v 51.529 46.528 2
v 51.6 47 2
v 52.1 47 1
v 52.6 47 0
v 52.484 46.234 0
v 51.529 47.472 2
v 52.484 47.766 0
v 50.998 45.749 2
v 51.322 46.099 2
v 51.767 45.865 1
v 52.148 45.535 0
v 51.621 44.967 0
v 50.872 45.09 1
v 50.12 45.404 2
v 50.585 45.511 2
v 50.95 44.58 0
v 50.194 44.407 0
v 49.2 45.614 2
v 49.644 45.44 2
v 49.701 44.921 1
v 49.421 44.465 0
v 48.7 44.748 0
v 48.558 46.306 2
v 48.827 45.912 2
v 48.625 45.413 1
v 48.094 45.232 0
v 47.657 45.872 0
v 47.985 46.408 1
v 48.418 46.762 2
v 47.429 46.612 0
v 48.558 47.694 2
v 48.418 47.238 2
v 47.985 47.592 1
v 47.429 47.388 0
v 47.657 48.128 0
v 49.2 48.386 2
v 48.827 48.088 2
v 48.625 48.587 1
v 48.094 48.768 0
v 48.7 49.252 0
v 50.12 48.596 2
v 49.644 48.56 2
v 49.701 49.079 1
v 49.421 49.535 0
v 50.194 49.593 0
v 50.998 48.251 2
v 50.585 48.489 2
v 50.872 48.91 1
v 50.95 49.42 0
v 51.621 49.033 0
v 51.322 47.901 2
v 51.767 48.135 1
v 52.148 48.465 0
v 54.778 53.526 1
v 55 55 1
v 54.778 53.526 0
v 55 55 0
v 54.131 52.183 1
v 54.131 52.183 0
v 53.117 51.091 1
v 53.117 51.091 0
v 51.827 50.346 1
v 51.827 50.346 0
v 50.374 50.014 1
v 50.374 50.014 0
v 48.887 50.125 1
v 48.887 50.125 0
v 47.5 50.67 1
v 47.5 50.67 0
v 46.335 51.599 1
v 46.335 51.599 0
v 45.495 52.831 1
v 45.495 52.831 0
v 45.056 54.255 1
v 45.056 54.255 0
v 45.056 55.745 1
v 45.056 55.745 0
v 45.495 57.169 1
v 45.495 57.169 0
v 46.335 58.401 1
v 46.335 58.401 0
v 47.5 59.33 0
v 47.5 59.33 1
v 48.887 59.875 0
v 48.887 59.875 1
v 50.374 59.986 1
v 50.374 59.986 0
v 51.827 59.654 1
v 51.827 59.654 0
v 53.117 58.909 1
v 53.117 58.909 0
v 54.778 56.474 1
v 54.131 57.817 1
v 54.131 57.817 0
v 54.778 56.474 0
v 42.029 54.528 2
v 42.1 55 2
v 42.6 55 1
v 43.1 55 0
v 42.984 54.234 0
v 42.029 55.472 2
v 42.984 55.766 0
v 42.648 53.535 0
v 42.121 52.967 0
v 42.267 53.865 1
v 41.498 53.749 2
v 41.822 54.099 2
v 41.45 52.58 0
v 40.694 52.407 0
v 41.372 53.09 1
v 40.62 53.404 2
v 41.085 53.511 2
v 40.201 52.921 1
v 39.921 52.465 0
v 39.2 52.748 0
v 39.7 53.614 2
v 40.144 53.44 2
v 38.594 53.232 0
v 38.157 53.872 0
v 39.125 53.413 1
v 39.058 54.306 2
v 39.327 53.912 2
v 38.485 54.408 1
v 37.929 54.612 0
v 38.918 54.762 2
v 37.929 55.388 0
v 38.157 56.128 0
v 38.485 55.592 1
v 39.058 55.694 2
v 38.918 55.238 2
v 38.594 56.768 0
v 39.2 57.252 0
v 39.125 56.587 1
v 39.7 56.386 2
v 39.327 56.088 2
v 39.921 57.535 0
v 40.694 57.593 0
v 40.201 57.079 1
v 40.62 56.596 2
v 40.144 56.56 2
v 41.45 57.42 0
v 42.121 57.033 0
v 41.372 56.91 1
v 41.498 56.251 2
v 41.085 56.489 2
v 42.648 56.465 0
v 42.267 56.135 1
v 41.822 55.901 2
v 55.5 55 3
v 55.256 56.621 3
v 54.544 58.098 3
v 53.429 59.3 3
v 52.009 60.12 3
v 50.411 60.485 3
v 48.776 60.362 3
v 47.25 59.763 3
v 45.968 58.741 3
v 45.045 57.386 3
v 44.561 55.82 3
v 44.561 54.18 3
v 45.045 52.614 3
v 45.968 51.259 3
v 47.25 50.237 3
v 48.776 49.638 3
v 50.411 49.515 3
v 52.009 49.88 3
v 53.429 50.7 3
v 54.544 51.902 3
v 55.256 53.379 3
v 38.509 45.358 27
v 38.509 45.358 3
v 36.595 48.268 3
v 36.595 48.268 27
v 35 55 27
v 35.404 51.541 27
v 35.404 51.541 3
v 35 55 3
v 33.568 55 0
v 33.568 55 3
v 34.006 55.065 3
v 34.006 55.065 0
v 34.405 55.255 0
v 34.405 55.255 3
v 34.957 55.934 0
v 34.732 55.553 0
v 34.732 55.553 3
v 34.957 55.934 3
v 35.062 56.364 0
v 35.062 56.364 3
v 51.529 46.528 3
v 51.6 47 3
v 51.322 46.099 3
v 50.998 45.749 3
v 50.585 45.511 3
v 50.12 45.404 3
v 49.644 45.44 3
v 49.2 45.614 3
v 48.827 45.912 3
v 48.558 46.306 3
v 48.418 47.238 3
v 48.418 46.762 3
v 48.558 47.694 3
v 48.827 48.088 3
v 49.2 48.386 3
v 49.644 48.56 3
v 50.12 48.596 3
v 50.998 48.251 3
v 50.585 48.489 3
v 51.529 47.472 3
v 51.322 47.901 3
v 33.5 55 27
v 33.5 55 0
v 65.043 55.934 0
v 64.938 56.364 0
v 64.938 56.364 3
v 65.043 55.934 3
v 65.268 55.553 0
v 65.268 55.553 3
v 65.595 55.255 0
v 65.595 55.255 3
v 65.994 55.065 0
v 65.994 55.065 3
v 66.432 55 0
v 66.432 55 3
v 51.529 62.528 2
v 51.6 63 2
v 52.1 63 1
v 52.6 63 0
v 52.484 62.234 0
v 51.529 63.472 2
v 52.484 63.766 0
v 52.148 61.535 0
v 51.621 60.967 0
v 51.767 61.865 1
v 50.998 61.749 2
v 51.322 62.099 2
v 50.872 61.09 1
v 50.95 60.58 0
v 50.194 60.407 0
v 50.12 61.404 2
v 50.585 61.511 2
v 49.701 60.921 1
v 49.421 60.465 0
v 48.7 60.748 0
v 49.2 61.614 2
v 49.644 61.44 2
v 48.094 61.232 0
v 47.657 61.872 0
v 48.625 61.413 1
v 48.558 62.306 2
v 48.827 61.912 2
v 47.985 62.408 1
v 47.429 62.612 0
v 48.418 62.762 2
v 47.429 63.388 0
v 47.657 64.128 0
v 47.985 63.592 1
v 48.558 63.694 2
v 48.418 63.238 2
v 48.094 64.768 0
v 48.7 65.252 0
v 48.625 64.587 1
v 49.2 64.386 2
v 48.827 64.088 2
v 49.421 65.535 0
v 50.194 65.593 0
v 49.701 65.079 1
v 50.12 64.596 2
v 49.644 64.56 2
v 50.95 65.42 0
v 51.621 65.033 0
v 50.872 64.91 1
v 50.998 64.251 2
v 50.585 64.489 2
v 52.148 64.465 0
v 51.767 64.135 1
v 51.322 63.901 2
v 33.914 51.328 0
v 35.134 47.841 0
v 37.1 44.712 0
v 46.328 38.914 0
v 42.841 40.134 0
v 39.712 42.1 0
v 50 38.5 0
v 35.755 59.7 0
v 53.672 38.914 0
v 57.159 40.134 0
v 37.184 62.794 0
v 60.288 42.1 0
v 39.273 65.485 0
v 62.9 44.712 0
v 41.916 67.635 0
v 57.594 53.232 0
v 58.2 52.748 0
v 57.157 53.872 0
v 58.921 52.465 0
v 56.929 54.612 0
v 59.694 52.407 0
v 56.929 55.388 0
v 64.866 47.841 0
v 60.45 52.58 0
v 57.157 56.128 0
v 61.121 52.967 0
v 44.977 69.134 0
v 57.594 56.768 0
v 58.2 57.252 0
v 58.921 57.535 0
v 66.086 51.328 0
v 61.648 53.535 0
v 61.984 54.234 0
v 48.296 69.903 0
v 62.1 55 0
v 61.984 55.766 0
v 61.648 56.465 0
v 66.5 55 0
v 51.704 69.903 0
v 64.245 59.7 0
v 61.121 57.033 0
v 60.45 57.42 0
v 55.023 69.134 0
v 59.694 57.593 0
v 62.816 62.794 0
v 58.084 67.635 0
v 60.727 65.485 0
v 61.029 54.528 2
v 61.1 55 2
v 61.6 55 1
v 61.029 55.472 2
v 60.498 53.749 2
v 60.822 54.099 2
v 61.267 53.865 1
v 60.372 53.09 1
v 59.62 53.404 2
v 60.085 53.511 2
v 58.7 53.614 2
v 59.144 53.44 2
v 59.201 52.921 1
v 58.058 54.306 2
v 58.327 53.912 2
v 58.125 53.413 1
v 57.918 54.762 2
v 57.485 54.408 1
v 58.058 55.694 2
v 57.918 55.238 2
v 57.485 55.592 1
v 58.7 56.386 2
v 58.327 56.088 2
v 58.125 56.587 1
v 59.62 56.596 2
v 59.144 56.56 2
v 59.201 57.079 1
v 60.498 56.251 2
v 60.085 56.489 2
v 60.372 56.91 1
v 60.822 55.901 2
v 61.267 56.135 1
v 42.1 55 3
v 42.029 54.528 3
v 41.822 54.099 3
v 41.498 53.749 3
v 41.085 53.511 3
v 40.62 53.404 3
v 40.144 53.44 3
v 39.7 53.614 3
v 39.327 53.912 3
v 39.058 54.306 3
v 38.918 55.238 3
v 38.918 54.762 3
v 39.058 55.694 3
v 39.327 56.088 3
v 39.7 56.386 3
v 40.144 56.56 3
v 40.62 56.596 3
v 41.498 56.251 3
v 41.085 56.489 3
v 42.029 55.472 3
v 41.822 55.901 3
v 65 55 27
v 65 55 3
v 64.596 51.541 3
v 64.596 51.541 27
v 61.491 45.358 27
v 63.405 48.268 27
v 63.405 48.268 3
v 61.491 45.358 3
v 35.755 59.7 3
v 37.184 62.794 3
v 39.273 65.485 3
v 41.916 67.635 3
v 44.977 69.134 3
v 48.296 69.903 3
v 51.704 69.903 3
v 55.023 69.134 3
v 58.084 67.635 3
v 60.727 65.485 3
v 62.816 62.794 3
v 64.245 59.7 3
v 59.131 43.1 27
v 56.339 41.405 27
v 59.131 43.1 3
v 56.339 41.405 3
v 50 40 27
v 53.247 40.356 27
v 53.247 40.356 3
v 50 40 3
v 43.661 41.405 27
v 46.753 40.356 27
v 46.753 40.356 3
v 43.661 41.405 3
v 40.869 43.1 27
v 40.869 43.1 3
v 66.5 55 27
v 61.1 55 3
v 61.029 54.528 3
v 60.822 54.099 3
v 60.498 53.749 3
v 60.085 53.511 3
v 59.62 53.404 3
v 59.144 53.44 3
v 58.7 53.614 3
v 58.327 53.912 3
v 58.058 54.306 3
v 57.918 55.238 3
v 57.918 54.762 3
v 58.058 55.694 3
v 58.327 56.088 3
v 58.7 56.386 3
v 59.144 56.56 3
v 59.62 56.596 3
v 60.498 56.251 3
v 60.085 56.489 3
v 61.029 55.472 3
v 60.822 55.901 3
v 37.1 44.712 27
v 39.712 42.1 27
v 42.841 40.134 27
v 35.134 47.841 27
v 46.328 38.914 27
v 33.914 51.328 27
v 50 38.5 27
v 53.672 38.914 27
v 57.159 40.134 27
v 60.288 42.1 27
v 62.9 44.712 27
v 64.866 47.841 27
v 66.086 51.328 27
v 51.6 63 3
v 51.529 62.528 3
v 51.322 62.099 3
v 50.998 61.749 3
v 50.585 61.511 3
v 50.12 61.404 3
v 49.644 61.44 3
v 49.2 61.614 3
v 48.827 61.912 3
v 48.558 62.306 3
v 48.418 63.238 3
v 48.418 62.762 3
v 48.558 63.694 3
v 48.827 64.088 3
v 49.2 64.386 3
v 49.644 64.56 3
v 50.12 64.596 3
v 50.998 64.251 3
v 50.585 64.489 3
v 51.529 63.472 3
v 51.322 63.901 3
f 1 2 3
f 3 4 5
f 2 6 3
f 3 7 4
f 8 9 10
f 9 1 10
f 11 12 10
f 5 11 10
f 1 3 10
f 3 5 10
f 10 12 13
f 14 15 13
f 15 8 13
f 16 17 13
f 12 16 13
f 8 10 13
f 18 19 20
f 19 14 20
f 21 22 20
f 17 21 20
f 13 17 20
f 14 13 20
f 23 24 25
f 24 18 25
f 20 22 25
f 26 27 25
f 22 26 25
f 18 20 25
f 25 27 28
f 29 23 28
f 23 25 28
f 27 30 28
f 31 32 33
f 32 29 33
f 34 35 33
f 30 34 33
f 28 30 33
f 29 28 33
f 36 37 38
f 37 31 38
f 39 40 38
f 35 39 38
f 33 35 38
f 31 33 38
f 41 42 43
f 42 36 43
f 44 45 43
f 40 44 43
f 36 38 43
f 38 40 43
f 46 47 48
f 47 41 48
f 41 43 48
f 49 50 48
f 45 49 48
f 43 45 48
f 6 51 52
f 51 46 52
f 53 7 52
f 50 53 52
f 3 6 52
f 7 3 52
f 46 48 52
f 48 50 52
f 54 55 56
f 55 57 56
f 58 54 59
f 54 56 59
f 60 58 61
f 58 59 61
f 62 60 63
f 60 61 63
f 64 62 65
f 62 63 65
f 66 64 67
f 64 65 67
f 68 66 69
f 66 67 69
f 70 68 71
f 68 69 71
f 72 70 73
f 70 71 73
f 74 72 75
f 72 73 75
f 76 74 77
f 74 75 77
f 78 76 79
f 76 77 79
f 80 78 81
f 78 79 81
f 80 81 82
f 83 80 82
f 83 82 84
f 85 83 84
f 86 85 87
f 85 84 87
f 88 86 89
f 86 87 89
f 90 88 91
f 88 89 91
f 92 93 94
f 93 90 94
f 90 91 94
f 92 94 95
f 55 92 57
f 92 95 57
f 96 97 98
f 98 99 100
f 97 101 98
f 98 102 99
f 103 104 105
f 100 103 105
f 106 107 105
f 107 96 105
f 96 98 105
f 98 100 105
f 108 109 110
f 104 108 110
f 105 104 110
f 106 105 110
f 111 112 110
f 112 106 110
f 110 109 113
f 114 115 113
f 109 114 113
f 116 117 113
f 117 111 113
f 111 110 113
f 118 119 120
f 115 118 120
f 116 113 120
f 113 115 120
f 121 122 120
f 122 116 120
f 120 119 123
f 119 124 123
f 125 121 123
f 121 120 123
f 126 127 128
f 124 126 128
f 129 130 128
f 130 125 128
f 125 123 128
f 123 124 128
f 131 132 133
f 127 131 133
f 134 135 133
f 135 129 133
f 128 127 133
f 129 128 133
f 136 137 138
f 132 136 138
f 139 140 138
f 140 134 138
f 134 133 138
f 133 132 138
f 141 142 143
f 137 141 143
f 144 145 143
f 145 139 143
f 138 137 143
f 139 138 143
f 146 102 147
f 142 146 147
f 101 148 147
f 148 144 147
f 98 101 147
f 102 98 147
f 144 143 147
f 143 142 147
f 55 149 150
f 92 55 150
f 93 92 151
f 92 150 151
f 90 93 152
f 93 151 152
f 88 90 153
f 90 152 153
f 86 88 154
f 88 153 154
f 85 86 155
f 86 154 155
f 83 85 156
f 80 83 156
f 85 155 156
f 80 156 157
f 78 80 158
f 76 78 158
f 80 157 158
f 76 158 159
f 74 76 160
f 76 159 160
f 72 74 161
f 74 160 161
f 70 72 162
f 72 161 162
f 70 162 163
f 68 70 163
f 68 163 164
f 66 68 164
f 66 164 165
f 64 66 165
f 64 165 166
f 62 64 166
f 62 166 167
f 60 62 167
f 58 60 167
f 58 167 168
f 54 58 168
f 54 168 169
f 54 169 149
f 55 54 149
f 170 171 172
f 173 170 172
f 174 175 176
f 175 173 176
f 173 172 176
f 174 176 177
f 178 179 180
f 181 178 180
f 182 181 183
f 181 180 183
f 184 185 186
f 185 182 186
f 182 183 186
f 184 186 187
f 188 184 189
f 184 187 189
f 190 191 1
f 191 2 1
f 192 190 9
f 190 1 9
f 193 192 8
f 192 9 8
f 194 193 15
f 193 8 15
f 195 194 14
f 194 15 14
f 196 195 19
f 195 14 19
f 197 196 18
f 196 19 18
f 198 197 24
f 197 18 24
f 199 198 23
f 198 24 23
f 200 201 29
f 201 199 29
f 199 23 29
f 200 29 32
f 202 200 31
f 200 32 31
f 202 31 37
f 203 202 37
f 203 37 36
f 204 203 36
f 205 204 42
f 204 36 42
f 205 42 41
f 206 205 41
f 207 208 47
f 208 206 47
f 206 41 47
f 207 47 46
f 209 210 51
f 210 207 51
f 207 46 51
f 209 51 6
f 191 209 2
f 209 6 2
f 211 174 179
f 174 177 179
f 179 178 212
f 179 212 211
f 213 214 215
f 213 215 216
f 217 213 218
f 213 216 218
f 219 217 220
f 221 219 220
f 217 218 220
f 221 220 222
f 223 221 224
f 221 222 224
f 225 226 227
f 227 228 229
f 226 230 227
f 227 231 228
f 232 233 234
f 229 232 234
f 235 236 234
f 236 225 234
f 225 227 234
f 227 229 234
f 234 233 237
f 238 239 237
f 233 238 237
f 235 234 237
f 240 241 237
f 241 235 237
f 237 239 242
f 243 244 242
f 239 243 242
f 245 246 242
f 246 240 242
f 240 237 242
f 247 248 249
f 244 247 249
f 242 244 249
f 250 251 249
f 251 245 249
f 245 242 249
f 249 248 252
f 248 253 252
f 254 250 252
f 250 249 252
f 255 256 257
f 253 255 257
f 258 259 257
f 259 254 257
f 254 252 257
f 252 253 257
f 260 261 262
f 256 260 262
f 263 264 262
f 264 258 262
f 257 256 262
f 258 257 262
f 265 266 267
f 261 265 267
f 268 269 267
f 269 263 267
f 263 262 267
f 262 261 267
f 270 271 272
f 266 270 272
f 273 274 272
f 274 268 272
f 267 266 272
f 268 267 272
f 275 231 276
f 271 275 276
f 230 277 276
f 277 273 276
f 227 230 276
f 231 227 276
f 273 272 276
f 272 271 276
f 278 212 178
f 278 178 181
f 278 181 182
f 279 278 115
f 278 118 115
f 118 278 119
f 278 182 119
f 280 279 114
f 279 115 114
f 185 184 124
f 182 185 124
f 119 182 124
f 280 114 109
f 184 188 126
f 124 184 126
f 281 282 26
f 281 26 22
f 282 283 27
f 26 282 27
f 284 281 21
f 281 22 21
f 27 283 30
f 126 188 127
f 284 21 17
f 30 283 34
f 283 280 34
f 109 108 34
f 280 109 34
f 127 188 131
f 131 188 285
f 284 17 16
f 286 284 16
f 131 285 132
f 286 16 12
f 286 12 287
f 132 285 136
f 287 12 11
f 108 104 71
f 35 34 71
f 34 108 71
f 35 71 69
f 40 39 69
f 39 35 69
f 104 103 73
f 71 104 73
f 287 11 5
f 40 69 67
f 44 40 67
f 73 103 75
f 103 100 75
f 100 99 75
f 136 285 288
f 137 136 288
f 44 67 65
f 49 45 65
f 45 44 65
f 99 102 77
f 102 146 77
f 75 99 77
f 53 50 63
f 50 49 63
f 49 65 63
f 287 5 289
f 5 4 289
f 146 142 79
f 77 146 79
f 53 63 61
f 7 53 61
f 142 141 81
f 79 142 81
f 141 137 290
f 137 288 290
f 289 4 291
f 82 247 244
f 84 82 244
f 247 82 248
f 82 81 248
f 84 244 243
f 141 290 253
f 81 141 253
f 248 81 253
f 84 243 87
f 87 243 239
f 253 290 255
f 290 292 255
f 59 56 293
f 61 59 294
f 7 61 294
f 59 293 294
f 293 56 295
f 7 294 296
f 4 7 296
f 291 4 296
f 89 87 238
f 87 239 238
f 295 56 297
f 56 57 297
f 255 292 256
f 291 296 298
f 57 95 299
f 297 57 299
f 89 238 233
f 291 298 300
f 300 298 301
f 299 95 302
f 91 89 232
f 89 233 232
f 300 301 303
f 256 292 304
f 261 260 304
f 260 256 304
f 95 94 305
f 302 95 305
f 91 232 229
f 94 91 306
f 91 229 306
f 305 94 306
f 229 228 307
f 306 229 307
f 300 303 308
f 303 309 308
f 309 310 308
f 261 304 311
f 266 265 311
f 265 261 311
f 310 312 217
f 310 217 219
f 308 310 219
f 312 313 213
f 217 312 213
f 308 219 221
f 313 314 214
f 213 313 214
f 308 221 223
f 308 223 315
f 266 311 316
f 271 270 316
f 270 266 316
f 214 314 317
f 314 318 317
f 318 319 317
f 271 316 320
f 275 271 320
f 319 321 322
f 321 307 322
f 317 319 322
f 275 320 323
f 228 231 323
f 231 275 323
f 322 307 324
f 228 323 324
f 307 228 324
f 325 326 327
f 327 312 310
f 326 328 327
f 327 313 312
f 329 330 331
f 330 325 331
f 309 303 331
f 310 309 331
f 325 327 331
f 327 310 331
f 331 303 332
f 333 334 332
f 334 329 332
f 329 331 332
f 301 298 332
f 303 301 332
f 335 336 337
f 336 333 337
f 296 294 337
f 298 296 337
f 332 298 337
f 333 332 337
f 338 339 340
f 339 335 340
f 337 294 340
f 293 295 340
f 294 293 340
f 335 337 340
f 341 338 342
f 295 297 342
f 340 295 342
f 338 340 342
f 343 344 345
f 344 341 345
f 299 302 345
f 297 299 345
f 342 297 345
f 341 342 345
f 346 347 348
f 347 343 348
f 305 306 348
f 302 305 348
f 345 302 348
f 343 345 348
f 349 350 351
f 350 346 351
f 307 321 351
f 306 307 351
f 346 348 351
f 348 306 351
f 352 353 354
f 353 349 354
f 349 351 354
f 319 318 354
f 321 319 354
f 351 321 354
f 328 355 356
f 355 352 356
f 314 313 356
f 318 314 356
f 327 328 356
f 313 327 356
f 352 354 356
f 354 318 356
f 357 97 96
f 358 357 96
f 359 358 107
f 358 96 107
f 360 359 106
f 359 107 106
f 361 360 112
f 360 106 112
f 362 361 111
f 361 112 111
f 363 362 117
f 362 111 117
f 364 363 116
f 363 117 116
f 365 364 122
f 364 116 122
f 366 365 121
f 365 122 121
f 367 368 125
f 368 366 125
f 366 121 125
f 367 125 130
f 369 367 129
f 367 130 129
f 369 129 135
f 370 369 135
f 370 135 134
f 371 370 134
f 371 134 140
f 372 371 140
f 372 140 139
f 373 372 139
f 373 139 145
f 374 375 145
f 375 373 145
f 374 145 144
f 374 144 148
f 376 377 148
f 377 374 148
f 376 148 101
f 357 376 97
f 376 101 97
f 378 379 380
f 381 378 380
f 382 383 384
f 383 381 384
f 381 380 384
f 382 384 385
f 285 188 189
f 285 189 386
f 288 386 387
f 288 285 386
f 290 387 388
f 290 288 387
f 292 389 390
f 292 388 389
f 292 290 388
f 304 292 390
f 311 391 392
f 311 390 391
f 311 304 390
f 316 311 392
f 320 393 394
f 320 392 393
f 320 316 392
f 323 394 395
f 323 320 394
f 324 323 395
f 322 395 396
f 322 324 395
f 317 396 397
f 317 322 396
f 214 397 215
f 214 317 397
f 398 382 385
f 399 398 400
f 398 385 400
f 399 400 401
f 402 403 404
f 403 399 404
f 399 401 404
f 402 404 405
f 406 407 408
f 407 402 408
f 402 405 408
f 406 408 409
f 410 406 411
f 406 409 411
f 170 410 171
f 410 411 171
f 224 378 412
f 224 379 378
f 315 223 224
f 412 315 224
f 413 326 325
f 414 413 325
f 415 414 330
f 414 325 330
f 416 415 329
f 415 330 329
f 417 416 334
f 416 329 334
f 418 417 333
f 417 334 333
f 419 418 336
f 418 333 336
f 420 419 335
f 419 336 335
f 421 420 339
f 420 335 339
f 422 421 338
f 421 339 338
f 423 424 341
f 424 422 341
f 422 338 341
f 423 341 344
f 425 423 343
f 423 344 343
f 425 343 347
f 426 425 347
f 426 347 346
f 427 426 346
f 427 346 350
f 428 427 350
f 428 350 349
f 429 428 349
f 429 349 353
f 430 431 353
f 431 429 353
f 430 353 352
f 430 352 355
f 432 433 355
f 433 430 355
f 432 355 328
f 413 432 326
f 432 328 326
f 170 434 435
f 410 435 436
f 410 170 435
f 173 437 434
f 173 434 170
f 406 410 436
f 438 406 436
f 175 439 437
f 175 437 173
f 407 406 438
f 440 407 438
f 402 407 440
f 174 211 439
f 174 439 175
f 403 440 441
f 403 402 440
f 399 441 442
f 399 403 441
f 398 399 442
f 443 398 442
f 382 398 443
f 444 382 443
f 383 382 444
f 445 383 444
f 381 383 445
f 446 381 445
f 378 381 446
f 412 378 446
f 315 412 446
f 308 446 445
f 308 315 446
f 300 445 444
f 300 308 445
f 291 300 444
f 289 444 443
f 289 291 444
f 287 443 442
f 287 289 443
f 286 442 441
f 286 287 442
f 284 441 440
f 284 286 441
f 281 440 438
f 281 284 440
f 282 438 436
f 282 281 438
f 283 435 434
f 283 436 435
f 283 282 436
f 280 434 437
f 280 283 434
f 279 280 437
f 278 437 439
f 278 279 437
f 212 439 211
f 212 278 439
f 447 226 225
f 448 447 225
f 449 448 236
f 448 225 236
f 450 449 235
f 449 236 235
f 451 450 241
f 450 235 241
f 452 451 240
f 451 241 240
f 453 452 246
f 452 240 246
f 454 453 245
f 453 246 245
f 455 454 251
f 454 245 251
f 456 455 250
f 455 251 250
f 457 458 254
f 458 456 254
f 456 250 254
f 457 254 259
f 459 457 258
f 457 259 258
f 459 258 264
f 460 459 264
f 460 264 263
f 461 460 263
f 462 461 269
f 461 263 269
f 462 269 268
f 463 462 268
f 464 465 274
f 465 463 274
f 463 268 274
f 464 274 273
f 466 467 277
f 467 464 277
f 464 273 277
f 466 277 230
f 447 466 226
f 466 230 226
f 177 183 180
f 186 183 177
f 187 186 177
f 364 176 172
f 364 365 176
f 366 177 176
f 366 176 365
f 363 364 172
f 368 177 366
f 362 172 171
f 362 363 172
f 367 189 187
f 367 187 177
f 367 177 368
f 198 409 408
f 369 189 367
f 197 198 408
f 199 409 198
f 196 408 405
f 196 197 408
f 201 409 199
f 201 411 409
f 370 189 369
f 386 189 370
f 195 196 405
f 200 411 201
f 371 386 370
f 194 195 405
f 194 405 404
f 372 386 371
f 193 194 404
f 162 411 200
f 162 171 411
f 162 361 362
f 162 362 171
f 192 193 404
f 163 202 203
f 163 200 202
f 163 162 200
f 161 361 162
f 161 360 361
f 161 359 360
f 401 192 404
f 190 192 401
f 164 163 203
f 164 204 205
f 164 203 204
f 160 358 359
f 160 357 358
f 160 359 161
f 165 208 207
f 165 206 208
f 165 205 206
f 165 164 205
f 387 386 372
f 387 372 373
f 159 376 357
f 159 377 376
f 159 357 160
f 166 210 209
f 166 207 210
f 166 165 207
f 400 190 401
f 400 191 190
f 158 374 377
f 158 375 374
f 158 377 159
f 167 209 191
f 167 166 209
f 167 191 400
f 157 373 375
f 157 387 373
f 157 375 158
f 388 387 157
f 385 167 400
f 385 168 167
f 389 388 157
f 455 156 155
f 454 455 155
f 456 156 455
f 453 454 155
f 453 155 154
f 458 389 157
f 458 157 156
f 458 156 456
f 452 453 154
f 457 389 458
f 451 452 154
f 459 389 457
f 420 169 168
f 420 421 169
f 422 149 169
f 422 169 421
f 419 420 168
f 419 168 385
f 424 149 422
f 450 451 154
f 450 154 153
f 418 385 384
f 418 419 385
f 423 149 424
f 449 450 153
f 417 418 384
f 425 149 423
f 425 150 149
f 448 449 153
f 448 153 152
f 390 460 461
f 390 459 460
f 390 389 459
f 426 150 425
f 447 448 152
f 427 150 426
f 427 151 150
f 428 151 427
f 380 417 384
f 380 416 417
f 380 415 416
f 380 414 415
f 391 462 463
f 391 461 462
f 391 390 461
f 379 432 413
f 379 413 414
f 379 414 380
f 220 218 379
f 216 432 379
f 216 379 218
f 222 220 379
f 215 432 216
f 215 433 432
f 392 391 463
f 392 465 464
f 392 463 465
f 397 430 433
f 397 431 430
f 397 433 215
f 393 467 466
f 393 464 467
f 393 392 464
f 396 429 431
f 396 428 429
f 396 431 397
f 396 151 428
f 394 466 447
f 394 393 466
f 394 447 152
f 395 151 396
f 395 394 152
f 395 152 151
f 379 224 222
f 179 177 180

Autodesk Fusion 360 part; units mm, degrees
sketch "Sketch1" plane through (0, 0, 0) normal (0, 0, 1) x (1, 0, 0)
  line L0 (50, 55) -> (66, 55) construction
  line L1 (50, 55) -> (34, 55) construction
  line L2 (50, 55) -> (50, 39) construction
  line L3 (50, 55) -> (50, 71) construction
  circle A0 centre (40.5, 55) radius 1.6
  circle A1 centre (50, 63) radius 1.6
  circle A2 centre (59.5, 55) radius 1.6
  circle A3 centre (50, 47) radius 1.6
  line L4 (65, 55) -> (66, 55)
  line L5 (35, 55) -> (34, 55)
  line L6 (50, 55) -> (46.1698, 51.7861) construction
  arc A4 (61.4907, 45.3582) -> (65, 55) centre (50, 55) ccw
  arc A5 (35, 55) -> (38.5093, 45.3582) centre (50, 55) ccw
  circle A6 centre (50, 55) radius 5
  line L7 (34, 55) -> (33.5, 55)
  line L8 (66, 55) -> (66.5, 55)
  circle A7 centre (50, 55) radius 15
  line L9 (50, 55) -> (53.8302, 51.7861) construction
  line L10 (61.4907, 45.3582) -> (62.2567, 44.7154) construction
  arc A8 (33.5, 55) -> (66.5, 55) centre (50, 55) ccw
  point P0 (59.5, 55)
  point P1 (50, 63)
  point P2 (50, 47)
  point P3 (40.5, 55)
  dimension "d23" = 30
  dimension "d25" = 8
  dimension "d26" = 8
  dimension "d27" = 9.5
  dimension "d28" = 9.5
  dimension "d29" = 3.2
  dimension "d30" = 3.2
  dimension "d31" = 3.2
  dimension "d32" = 3.2
  dimension "d33" = 140
  dimension "d34" = 80
  dimension "d41" = 10
  dimension "d44" = 33
extrude "Extrude7" add sketch "Sketch1" along normal blind 3 contours A4 A5 A7
extrude "Extrude8" add sketch "Sketch1" along normal blind 27 contours L4 L5 A4 A5 L7 L8 A7 A8
chamfer "Chamfer2" distance 0.5 distance2 2 1 edges at (45.3384, 56.8081, 3) measured on face at (42.065, 60.0544, 3)
chamfer "Chamfer3" distance 2 distance2 1 4 edges at (58.0083, 55.5786, 0) (48.5083, 47.5786, 0) (39.0083, 55.5786, 0) (48.5083, 63.5786, 0) measured on face at (60.434, 56.2991, 2) measured on face at (50.934, 48.2991, 2) measured on face at (41.434, 56.2991, 2) measured on face at (51.0587, 64.1997, 2)
fillet "Fillet1" radius 1.5 2 edges at (65, 55, 1.5) (35, 55, 1.5)
sketch "Sketch2" plane through (0, 0, 0) normal (0, 1, 0) x (1, 0, 0)
